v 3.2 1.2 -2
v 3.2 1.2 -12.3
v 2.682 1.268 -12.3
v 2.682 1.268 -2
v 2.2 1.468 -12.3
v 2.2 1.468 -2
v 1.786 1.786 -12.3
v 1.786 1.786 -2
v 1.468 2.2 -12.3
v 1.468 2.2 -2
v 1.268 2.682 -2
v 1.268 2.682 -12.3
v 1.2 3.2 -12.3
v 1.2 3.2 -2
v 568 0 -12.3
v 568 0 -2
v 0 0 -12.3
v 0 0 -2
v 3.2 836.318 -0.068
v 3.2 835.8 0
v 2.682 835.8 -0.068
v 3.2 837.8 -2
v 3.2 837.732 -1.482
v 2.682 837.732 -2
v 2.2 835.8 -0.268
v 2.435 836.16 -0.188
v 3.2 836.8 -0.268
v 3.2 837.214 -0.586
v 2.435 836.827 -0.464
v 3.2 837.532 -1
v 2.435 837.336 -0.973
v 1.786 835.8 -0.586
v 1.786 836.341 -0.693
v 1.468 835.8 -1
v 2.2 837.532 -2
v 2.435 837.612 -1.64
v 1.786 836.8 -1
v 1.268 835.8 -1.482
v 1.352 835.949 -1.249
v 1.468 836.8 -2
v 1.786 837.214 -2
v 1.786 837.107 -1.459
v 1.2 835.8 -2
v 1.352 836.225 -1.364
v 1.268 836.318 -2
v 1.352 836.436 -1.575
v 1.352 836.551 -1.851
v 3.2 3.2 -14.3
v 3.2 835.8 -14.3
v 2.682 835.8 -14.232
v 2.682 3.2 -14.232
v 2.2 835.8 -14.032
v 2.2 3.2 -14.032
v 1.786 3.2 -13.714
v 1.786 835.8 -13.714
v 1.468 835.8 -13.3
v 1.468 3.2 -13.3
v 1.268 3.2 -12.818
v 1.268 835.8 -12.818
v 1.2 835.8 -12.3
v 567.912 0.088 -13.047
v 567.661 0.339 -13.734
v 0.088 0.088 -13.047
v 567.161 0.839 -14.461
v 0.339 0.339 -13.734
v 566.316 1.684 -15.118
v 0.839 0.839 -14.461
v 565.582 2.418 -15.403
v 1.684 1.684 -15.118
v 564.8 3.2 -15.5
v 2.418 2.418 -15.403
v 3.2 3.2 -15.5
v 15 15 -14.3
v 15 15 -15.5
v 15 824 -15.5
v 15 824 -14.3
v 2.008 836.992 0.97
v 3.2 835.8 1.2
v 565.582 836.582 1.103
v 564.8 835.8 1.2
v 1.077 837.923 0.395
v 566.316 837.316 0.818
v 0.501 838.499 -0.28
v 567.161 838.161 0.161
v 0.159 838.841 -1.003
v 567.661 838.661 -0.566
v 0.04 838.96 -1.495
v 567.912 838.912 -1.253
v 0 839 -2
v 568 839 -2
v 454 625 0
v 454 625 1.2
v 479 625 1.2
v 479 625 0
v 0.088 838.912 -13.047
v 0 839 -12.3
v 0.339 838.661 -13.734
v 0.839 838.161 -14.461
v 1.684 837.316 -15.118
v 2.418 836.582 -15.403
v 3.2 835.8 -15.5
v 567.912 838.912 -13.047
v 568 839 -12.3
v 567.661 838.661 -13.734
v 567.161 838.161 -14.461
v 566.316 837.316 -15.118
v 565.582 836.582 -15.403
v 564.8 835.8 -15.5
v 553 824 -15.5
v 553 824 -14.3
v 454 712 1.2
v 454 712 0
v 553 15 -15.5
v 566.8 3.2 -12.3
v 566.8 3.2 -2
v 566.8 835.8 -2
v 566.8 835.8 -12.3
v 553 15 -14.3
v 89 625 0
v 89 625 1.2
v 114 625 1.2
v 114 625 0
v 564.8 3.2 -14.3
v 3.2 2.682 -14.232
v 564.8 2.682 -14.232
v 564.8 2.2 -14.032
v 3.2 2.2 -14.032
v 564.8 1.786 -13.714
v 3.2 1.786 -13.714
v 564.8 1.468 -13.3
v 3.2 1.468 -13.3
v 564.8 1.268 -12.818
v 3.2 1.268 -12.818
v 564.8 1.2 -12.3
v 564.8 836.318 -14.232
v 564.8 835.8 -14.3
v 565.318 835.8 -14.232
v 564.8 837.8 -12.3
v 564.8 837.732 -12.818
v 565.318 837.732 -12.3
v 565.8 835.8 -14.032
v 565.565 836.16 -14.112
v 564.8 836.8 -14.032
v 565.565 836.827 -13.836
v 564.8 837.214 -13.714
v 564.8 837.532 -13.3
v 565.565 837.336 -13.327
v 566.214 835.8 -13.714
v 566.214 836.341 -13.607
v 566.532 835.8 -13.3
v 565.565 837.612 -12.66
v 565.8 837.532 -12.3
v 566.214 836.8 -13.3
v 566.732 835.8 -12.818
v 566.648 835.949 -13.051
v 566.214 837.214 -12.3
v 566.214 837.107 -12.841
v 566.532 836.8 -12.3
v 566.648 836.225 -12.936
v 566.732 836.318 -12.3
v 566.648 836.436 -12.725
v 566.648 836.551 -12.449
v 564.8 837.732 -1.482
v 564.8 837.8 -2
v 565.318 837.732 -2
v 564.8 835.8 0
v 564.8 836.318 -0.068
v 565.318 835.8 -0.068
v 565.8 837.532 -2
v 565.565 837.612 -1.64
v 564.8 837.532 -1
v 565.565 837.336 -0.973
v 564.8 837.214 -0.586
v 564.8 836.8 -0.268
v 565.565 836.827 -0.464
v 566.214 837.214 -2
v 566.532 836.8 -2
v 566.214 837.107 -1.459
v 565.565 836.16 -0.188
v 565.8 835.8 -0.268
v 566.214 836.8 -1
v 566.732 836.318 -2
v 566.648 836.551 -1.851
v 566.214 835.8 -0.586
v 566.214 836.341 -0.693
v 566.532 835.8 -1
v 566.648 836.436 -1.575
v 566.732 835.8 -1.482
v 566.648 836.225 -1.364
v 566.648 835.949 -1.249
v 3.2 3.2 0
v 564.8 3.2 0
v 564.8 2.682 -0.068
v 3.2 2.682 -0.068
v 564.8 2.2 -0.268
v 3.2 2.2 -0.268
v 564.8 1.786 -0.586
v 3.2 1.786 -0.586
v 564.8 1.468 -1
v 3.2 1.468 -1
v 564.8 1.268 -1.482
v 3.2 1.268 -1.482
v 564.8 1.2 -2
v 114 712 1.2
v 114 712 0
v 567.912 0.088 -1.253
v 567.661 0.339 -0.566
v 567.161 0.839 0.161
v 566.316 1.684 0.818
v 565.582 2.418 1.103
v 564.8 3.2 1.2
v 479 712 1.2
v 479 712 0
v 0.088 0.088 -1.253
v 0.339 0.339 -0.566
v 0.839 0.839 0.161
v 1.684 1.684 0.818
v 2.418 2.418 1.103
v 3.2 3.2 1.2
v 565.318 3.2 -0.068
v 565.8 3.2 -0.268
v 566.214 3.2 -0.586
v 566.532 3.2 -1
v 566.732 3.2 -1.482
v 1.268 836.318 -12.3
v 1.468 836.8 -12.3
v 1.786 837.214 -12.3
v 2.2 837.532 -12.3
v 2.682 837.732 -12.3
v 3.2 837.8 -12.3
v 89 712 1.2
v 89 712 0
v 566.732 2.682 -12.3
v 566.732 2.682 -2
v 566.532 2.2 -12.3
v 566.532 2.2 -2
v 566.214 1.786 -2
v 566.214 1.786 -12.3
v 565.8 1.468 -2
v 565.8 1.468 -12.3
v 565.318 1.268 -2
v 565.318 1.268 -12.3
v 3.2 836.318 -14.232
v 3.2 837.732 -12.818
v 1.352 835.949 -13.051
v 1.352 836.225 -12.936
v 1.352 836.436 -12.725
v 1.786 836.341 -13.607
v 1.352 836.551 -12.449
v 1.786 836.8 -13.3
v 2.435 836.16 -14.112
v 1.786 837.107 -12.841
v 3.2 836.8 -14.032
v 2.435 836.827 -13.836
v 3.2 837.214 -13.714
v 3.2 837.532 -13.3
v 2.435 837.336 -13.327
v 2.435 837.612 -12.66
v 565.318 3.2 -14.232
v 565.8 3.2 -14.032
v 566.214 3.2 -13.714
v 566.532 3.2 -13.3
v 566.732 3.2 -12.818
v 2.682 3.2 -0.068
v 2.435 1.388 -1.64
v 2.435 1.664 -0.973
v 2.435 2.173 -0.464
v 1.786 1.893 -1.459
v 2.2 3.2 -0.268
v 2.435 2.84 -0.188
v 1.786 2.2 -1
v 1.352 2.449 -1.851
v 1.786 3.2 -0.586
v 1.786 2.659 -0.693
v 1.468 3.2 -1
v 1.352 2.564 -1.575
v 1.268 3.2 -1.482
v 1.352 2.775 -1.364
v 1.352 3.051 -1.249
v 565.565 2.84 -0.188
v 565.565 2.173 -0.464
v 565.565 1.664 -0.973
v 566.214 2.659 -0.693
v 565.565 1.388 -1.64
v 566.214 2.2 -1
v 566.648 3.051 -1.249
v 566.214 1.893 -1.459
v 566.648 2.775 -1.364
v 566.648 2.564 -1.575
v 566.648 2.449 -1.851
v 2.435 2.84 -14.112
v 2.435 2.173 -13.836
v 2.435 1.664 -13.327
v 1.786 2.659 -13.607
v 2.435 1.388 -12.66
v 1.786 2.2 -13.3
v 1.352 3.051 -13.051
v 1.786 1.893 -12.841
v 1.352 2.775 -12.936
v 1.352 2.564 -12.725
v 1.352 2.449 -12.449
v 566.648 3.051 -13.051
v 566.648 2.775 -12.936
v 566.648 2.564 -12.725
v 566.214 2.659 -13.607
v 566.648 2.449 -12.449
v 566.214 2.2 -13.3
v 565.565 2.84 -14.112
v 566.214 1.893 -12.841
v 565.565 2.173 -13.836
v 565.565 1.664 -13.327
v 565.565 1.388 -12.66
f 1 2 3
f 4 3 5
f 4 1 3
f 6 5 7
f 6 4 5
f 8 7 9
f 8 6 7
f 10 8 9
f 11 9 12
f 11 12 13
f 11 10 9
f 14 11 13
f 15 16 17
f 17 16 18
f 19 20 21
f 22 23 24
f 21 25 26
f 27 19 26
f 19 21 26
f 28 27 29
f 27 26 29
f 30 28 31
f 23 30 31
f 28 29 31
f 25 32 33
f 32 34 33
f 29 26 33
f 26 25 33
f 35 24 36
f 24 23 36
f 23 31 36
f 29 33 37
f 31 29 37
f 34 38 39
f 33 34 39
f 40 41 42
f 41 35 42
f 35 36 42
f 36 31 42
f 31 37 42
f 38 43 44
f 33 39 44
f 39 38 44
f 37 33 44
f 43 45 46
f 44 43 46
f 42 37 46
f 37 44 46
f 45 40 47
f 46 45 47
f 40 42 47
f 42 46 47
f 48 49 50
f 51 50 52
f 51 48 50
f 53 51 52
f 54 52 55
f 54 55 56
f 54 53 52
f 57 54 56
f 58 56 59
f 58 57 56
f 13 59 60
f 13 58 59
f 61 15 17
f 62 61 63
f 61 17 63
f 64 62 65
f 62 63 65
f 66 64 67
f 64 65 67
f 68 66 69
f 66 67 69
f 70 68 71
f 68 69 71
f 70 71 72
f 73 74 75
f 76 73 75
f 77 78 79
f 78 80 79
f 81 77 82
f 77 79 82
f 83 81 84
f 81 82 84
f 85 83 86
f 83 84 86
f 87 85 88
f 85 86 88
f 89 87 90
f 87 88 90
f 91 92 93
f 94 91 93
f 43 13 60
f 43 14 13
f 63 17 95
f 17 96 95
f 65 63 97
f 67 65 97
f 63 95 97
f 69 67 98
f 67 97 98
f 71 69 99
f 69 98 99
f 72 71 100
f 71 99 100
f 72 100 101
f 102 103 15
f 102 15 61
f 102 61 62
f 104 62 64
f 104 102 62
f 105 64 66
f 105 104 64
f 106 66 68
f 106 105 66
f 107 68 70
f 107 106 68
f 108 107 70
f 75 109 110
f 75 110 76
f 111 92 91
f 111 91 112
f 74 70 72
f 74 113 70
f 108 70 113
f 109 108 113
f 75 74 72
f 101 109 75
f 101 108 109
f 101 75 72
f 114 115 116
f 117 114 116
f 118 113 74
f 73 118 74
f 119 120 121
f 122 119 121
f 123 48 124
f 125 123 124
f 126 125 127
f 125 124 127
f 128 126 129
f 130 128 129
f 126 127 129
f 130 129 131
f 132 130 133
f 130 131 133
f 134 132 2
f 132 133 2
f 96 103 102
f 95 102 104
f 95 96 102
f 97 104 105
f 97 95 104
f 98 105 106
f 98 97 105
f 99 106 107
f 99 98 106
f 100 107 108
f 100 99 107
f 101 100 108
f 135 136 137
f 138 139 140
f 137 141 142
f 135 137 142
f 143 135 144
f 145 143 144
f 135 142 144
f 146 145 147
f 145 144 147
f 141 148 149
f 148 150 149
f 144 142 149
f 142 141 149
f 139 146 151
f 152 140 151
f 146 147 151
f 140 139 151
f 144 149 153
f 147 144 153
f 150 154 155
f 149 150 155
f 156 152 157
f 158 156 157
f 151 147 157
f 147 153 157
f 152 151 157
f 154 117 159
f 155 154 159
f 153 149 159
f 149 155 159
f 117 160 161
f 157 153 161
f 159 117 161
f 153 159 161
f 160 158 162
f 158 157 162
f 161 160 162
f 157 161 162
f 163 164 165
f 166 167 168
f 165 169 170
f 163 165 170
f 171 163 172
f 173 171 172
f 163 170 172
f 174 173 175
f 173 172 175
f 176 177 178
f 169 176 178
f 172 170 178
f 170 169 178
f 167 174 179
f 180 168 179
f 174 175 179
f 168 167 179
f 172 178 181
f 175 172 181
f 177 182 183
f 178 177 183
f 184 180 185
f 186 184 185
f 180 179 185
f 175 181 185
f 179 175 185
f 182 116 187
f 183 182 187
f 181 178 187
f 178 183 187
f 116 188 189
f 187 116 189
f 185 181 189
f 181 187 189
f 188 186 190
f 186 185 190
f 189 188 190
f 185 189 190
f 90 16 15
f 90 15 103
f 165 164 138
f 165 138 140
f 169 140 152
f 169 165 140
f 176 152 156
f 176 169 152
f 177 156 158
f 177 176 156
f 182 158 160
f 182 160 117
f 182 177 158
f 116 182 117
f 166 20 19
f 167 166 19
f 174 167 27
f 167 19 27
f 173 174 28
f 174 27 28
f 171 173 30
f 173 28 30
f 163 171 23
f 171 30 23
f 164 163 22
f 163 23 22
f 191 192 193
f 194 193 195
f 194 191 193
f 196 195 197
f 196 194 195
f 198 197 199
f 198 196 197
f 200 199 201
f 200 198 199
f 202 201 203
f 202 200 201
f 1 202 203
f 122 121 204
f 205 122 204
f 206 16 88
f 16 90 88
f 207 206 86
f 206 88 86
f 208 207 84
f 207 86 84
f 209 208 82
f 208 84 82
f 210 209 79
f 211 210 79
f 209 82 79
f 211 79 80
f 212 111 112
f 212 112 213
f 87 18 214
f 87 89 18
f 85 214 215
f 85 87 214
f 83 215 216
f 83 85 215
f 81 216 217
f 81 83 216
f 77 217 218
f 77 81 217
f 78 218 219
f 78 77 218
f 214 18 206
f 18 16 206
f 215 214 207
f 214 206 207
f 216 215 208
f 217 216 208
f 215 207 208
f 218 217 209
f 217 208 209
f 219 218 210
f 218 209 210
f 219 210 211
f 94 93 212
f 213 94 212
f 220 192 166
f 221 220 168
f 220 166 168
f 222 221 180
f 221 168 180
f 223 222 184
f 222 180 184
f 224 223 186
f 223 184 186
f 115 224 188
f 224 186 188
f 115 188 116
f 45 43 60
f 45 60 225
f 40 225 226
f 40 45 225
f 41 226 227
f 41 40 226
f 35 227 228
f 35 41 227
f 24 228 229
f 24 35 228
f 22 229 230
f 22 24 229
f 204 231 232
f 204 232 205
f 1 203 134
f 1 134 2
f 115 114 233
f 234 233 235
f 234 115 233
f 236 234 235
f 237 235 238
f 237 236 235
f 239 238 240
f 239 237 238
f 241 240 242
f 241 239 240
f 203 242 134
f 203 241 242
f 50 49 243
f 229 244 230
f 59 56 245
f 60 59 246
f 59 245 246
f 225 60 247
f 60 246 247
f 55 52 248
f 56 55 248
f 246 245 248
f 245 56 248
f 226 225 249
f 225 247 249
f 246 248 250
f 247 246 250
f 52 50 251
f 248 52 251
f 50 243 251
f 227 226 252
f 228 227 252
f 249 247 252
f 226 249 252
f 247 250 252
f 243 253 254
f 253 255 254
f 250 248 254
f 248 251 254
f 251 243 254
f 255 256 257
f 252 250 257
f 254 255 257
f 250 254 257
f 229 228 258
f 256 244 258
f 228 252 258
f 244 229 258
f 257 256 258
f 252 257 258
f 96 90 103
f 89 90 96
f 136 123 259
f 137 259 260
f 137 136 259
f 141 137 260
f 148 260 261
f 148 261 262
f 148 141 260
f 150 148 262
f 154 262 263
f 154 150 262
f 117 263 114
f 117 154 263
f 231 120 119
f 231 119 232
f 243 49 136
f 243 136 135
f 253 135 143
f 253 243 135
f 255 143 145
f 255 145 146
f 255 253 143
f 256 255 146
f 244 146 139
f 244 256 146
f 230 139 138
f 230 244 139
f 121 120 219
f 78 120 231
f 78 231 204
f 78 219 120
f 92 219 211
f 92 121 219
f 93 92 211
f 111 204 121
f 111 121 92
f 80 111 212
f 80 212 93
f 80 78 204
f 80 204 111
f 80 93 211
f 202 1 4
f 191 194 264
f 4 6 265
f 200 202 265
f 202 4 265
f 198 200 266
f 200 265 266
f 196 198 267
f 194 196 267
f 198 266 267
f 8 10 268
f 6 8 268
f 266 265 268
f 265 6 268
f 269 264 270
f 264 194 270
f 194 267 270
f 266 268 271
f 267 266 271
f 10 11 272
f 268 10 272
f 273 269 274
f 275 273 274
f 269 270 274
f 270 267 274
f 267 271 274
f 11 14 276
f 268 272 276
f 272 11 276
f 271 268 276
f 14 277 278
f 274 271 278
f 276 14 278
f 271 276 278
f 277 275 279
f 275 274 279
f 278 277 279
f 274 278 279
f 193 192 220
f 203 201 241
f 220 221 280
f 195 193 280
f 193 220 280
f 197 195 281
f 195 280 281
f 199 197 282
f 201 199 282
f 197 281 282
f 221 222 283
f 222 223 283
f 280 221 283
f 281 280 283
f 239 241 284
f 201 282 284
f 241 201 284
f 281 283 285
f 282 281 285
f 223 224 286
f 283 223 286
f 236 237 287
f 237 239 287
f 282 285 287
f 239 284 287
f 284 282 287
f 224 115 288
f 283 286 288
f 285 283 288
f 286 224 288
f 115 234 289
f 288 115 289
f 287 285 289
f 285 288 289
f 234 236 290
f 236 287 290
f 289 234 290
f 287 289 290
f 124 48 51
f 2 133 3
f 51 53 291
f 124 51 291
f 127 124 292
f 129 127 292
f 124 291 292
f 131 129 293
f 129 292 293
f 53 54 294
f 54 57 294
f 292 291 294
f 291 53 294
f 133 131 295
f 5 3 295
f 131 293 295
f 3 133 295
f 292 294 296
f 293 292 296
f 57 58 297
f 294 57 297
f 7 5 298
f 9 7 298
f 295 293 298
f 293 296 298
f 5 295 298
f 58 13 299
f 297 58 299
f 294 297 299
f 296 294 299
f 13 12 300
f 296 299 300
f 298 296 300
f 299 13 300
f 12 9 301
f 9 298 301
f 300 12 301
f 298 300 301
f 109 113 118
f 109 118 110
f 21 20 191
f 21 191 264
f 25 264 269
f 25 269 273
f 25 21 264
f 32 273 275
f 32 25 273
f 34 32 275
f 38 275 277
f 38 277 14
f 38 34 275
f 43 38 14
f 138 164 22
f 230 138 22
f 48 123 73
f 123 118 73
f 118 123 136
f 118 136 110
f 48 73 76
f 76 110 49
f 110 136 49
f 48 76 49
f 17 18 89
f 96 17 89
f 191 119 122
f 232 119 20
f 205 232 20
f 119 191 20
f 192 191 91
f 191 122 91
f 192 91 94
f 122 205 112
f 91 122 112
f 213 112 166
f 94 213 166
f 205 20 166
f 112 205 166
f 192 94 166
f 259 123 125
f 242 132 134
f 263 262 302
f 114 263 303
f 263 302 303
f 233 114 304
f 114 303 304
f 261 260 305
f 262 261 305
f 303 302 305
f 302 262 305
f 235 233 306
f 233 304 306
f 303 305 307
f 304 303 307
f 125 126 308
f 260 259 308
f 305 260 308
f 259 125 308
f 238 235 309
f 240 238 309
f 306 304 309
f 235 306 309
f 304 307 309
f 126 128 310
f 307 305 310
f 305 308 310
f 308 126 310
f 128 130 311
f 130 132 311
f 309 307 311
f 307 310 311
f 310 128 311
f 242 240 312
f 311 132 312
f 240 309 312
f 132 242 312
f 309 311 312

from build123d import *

# Parameters (mm, degrees)
SKETCH_1_W          = 568
SKETCH_1_H          = 839
EXTRUDE_1_DEPTH     = 1.2
SKETCH_2_W          = 25
SKETCH_2_H          = 87
CUT_EXTRUDE_1_DEPTH = 1014.186280997
SKETCH_3_W          = 568
SKETCH_3_H          = 839
SKETCH_3_W_2        = 565.6
SKETCH_3_H_2        = 836.6
EXTRUDE_2_DEPTH     = 15.5
SKETCH_4_W          = 568
SKETCH_4_H          = 839
SKETCH_4_W_2        = 538
SKETCH_4_H_2        = 809
EXTRUDE_3_DEPTH     = 1.2
FILLET_1_R          = 3.2
FILLET_3_R          = 2
FILLET_4_R          = 3.2
FILLET_5_R          = 2
FILLET_6_R          = 2


with BuildPart() as part:
    # 스케치1 → 보스-돌출1 (new body)
    with BuildSketch(Plane.XY):
        with Locations((284, 419.5)):
            Rectangle(SKETCH_1_W, SKETCH_1_H)
    extrude(amount=EXTRUDE_1_DEPTH)

    # 스케치2 → 컷-돌출1 (cut, through all)
    with BuildSketch(Plane.XY.offset(1.2)):
        with Locations((101.5, 668.5)):
            Rectangle(SKETCH_2_W, SKETCH_2_H)
        with Locations((466.5, 668.5)):
            Rectangle(SKETCH_2_W, SKETCH_2_H)
    extrude(amount=-CUT_EXTRUDE_1_DEPTH, mode=Mode.SUBTRACT)

    # 스케치3 → 보스-돌출2 (add)
    with BuildSketch(Plane(origin=(0, 0, 0), x_dir=(-1, 0, 0), z_dir=(0, 0, -1))):
        with Locations((-284, 419.5)):
            Rectangle(SKETCH_3_W, SKETCH_3_H)
        with Locations((-284, 419.5)):
            Rectangle(SKETCH_3_W_2, SKETCH_3_H_2, mode=Mode.SUBTRACT)
    extrude(amount=EXTRUDE_2_DEPTH)

    # 스케치4 → 보스-돌출3 (add)
    with BuildSketch(Plane(origin=(0, 0, -15.5), x_dir=(-1, 0, 0), z_dir=(0, 0, -1))):
        with Locations((-284, 419.5)):
            Rectangle(SKETCH_4_W, SKETCH_4_H)
        with Locations((-284, 419.5)):
            Rectangle(SKETCH_4_W_2, SKETCH_4_H_2, mode=Mode.SUBTRACT)
    extrude(amount=-EXTRUDE_3_DEPTH)

    # 필렛1
    fillet_1_edges = [part.edges().sort_by_distance(p)[0] for p in [
        (568, 419.5, 1.2),
        (284, 839, 1.2),
        (0, 419.5, 1.2),
        (284, 0, 1.2),
    ]]
    fillet(fillet_1_edges, radius=FILLET_1_R)

    # 필렛3
    fillet_3_edges = [part.edges().sort_by_distance(p)[0] for p in [
        (1.2, 419.5, 0),
        (284, 837.8, 0),
        (566.8, 419.5, 0),
        (284, 1.2, 0),
    ]]
    fillet(fillet_3_edges, radius=FILLET_3_R)

    # 필렛4
    fillet_4_edges = [part.edges().sort_by_distance(p)[0] for p in [
        (284, 0, -15.5),
        (0, 419.5, -15.5),
        (284, 839, -15.5),
        (568, 419.5, -15.5),
    ]]
    fillet(fillet_4_edges, radius=FILLET_4_R)

    # 필렛5
    fillet_5_edges = [part.edges().sort_by_distance(p)[0] for p in [
        (284, 1.2, -14.3),
        (284, 837.8, -14.3),
    ]]
    fillet(fillet_5_edges, radius=FILLET_5_R)

    # 필렛6
    # the kernel refuses this fillet: 2 mm, written as the material it adds along each edge
    with BuildSketch(Plane(origin=(564.8, 835.8, -2), x_dir=(0, 1, 0), z_dir=(1, 0, 0))) as fillet_6_piece_1_section:
        Polygon((0, 0), (FILLET_6_R, 0), (FILLET_6_R, FILLET_6_R), (0, FILLET_6_R), align=None)
    fillet_6_piece_1 = extrude(amount=FILLET_6_R, mode=Mode.PRIVATE)
    fillet_6_piece_1 = fillet_6_piece_1 - Plane(origin=(564.8, 835.8, -2), x_dir=(0, -0.7071067811865475, -0.7071067811865475), z_dir=(1, 0, 0)) * Sphere(FILLET_6_R, mode=Mode.PRIVATE)
    add(fillet_6_piece_1)
    with BuildSketch(Plane(origin=(3.2, 835.8, -2), x_dir=(0, 1, 0), z_dir=(-1, 0, 0))) as fillet_6_piece_2_section:
        Polygon((0, 0), (FILLET_6_R, 0), (FILLET_6_R, -FILLET_6_R), (0, -FILLET_6_R), align=None)
    fillet_6_piece_2 = extrude(amount=FILLET_6_R, mode=Mode.PRIVATE)
    fillet_6_piece_2 = fillet_6_piece_2 - Plane(origin=(3.2, 835.8, -2), x_dir=(0, -0.7071067811865475, -0.7071067811865475), z_dir=(-1, 0, 0)) * Sphere(FILLET_6_R, mode=Mode.PRIVATE)
    add(fillet_6_piece_2)
    with BuildSketch(Plane(origin=(564.8, 3.2, -2), x_dir=(0, -1, 0), z_dir=(1, 0, 0))) as fillet_6_piece_3_section:
        Polygon((0, 0), (FILLET_6_R, 0), (FILLET_6_R, -FILLET_6_R), (0, -FILLET_6_R), align=None)
    fillet_6_piece_3 = extrude(amount=FILLET_6_R, mode=Mode.PRIVATE)
    fillet_6_piece_3 = fillet_6_piece_3 - Plane(origin=(564.8, 3.2, -2), x_dir=(0, 0.7071067811865475, -0.7071067811865475), z_dir=(1, 0, 0)) * Sphere(FILLET_6_R, mode=Mode.PRIVATE)
    add(fillet_6_piece_3)
    with BuildSketch(Plane(origin=(3.2, 3.2, -2), x_dir=(0, -1, 0), z_dir=(-1, 0, 0))) as fillet_6_piece_4_section:
        Polygon((0, 0), (FILLET_6_R, 0), (FILLET_6_R, FILLET_6_R), (0, FILLET_6_R), align=None)
    fillet_6_piece_4 = extrude(amount=FILLET_6_R, mode=Mode.PRIVATE)
    fillet_6_piece_4 = fillet_6_piece_4 - Plane(origin=(3.2, 3.2, -2), x_dir=(0, 0.7071067811865475, -0.7071067811865475), z_dir=(-1, 0, 0)) * Sphere(FILLET_6_R, mode=Mode.PRIVATE)
    add(fillet_6_piece_4)
    with BuildSketch(Plane(origin=(566.8, 837.8, -2), x_dir=(0, -1, 0), z_dir=(0, 0, -1)), Plane(origin=(1.2, 1.2, -2), x_dir=(0, 1, 0), z_dir=(0, 0, -1))) as fillet_6_piece_5:
        with BuildLine():
            CenterArc((FILLET_6_R, FILLET_6_R), FILLET_6_R, 180, 90)
            Line((0, FILLET_6_R), (0, 0))
            Line((0, 0), (FILLET_6_R, 0))
        make_face()
    extrude(amount=10.3)
    with BuildSketch(Plane(origin=(1.2, 837.8, -2), x_dir=(0, -1, 0), z_dir=(0, 0, -1)), Plane(origin=(566.8, 1.2, -2), x_dir=(0, 1, 0), z_dir=(0, 0, -1))) as fillet_6_piece_6:
        with BuildLine():
            CenterArc((FILLET_6_R, -FILLET_6_R), FILLET_6_R, 90, 90)
            Line((0, -FILLET_6_R), (0, 0))
            Line((0, 0), (FILLET_6_R, 0))
        make_face()
    extrude(amount=10.3)
    with BuildSketch(Plane(origin=(566.8, 835.8, -14.3), x_dir=(-1, 0, 0), z_dir=(0, -1, 0)), Plane(origin=(1.2, 3.2, -14.3), x_dir=(1, 0, 0), z_dir=(0, 1, 0))) as fillet_6_piece_7:
        with BuildLine():
            CenterArc((FILLET_6_R, -FILLET_6_R), FILLET_6_R, 90, 90)
            Line((0, -FILLET_6_R), (0, 0))
            Line((0, 0), (FILLET_6_R, 0))
        make_face()
    extrude(amount=832.6)
    with BuildSketch(Plane(origin=(566.8, 3.2, -12.3), x_dir=(0, 0, -1), z_dir=(0, 1, 0))) as fillet_6_piece_8:
        with BuildLine():
            CenterArc((2 - FILLET_6_R, FILLET_6_R), FILLET_6_R, 270, 90)
            Line((2 - FILLET_6_R, 0), (2, 0))
            Line((2, 0), (2, FILLET_6_R))
        make_face()
    revolve(axis=Axis((566.8, 3.2, -12.3), (-1, 0, 0)), revolution_arc=90)
    with BuildSketch(Plane(origin=(566.8, 835.8, -12.3), x_dir=(0, 0, -1), z_dir=(0, -1, 0))) as fillet_6_piece_9:
        with BuildLine():
            CenterArc((2 - FILLET_6_R, -FILLET_6_R), FILLET_6_R, 0, 90)
            Line((2 - FILLET_6_R, 0), (2, 0))
            Line((2, 0), (2, -FILLET_6_R))
        make_face()
    revolve(axis=Axis((566.8, 835.8, -12.3), (1, 0, 0)), revolution_arc=90)
    with BuildSketch(Plane(origin=(1.2, 3.2, -12.3), x_dir=(0, 0, -1), z_dir=(0, 1, 0))) as fillet_6_piece_10:
        with BuildLine():
            CenterArc((2 - FILLET_6_R, -FILLET_6_R), FILLET_6_R, 360, 90)
            Line((2, -FILLET_6_R), (2, 0))
            Line((2, 0), (2 - FILLET_6_R, 0))
        make_face()
    revolve(axis=Axis((1.2, 3.2, -12.3), (-1, 0, 0)), revolution_arc=90)
    with BuildSketch(Plane(origin=(1.2, 835.8, -12.3), x_dir=(0, 0, -1), z_dir=(0, -1, 0))) as fillet_6_piece_11:
        with BuildLine():
            CenterArc((2 - FILLET_6_R, FILLET_6_R), FILLET_6_R, 270, 90)
            Line((2, FILLET_6_R), (2, 0))
            Line((2, 0), (2 - FILLET_6_R, 0))
        make_face()
    revolve(axis=Axis((1.2, 835.8, -12.3), (1, 0, 0)), revolution_arc=90)


solid = part.part
